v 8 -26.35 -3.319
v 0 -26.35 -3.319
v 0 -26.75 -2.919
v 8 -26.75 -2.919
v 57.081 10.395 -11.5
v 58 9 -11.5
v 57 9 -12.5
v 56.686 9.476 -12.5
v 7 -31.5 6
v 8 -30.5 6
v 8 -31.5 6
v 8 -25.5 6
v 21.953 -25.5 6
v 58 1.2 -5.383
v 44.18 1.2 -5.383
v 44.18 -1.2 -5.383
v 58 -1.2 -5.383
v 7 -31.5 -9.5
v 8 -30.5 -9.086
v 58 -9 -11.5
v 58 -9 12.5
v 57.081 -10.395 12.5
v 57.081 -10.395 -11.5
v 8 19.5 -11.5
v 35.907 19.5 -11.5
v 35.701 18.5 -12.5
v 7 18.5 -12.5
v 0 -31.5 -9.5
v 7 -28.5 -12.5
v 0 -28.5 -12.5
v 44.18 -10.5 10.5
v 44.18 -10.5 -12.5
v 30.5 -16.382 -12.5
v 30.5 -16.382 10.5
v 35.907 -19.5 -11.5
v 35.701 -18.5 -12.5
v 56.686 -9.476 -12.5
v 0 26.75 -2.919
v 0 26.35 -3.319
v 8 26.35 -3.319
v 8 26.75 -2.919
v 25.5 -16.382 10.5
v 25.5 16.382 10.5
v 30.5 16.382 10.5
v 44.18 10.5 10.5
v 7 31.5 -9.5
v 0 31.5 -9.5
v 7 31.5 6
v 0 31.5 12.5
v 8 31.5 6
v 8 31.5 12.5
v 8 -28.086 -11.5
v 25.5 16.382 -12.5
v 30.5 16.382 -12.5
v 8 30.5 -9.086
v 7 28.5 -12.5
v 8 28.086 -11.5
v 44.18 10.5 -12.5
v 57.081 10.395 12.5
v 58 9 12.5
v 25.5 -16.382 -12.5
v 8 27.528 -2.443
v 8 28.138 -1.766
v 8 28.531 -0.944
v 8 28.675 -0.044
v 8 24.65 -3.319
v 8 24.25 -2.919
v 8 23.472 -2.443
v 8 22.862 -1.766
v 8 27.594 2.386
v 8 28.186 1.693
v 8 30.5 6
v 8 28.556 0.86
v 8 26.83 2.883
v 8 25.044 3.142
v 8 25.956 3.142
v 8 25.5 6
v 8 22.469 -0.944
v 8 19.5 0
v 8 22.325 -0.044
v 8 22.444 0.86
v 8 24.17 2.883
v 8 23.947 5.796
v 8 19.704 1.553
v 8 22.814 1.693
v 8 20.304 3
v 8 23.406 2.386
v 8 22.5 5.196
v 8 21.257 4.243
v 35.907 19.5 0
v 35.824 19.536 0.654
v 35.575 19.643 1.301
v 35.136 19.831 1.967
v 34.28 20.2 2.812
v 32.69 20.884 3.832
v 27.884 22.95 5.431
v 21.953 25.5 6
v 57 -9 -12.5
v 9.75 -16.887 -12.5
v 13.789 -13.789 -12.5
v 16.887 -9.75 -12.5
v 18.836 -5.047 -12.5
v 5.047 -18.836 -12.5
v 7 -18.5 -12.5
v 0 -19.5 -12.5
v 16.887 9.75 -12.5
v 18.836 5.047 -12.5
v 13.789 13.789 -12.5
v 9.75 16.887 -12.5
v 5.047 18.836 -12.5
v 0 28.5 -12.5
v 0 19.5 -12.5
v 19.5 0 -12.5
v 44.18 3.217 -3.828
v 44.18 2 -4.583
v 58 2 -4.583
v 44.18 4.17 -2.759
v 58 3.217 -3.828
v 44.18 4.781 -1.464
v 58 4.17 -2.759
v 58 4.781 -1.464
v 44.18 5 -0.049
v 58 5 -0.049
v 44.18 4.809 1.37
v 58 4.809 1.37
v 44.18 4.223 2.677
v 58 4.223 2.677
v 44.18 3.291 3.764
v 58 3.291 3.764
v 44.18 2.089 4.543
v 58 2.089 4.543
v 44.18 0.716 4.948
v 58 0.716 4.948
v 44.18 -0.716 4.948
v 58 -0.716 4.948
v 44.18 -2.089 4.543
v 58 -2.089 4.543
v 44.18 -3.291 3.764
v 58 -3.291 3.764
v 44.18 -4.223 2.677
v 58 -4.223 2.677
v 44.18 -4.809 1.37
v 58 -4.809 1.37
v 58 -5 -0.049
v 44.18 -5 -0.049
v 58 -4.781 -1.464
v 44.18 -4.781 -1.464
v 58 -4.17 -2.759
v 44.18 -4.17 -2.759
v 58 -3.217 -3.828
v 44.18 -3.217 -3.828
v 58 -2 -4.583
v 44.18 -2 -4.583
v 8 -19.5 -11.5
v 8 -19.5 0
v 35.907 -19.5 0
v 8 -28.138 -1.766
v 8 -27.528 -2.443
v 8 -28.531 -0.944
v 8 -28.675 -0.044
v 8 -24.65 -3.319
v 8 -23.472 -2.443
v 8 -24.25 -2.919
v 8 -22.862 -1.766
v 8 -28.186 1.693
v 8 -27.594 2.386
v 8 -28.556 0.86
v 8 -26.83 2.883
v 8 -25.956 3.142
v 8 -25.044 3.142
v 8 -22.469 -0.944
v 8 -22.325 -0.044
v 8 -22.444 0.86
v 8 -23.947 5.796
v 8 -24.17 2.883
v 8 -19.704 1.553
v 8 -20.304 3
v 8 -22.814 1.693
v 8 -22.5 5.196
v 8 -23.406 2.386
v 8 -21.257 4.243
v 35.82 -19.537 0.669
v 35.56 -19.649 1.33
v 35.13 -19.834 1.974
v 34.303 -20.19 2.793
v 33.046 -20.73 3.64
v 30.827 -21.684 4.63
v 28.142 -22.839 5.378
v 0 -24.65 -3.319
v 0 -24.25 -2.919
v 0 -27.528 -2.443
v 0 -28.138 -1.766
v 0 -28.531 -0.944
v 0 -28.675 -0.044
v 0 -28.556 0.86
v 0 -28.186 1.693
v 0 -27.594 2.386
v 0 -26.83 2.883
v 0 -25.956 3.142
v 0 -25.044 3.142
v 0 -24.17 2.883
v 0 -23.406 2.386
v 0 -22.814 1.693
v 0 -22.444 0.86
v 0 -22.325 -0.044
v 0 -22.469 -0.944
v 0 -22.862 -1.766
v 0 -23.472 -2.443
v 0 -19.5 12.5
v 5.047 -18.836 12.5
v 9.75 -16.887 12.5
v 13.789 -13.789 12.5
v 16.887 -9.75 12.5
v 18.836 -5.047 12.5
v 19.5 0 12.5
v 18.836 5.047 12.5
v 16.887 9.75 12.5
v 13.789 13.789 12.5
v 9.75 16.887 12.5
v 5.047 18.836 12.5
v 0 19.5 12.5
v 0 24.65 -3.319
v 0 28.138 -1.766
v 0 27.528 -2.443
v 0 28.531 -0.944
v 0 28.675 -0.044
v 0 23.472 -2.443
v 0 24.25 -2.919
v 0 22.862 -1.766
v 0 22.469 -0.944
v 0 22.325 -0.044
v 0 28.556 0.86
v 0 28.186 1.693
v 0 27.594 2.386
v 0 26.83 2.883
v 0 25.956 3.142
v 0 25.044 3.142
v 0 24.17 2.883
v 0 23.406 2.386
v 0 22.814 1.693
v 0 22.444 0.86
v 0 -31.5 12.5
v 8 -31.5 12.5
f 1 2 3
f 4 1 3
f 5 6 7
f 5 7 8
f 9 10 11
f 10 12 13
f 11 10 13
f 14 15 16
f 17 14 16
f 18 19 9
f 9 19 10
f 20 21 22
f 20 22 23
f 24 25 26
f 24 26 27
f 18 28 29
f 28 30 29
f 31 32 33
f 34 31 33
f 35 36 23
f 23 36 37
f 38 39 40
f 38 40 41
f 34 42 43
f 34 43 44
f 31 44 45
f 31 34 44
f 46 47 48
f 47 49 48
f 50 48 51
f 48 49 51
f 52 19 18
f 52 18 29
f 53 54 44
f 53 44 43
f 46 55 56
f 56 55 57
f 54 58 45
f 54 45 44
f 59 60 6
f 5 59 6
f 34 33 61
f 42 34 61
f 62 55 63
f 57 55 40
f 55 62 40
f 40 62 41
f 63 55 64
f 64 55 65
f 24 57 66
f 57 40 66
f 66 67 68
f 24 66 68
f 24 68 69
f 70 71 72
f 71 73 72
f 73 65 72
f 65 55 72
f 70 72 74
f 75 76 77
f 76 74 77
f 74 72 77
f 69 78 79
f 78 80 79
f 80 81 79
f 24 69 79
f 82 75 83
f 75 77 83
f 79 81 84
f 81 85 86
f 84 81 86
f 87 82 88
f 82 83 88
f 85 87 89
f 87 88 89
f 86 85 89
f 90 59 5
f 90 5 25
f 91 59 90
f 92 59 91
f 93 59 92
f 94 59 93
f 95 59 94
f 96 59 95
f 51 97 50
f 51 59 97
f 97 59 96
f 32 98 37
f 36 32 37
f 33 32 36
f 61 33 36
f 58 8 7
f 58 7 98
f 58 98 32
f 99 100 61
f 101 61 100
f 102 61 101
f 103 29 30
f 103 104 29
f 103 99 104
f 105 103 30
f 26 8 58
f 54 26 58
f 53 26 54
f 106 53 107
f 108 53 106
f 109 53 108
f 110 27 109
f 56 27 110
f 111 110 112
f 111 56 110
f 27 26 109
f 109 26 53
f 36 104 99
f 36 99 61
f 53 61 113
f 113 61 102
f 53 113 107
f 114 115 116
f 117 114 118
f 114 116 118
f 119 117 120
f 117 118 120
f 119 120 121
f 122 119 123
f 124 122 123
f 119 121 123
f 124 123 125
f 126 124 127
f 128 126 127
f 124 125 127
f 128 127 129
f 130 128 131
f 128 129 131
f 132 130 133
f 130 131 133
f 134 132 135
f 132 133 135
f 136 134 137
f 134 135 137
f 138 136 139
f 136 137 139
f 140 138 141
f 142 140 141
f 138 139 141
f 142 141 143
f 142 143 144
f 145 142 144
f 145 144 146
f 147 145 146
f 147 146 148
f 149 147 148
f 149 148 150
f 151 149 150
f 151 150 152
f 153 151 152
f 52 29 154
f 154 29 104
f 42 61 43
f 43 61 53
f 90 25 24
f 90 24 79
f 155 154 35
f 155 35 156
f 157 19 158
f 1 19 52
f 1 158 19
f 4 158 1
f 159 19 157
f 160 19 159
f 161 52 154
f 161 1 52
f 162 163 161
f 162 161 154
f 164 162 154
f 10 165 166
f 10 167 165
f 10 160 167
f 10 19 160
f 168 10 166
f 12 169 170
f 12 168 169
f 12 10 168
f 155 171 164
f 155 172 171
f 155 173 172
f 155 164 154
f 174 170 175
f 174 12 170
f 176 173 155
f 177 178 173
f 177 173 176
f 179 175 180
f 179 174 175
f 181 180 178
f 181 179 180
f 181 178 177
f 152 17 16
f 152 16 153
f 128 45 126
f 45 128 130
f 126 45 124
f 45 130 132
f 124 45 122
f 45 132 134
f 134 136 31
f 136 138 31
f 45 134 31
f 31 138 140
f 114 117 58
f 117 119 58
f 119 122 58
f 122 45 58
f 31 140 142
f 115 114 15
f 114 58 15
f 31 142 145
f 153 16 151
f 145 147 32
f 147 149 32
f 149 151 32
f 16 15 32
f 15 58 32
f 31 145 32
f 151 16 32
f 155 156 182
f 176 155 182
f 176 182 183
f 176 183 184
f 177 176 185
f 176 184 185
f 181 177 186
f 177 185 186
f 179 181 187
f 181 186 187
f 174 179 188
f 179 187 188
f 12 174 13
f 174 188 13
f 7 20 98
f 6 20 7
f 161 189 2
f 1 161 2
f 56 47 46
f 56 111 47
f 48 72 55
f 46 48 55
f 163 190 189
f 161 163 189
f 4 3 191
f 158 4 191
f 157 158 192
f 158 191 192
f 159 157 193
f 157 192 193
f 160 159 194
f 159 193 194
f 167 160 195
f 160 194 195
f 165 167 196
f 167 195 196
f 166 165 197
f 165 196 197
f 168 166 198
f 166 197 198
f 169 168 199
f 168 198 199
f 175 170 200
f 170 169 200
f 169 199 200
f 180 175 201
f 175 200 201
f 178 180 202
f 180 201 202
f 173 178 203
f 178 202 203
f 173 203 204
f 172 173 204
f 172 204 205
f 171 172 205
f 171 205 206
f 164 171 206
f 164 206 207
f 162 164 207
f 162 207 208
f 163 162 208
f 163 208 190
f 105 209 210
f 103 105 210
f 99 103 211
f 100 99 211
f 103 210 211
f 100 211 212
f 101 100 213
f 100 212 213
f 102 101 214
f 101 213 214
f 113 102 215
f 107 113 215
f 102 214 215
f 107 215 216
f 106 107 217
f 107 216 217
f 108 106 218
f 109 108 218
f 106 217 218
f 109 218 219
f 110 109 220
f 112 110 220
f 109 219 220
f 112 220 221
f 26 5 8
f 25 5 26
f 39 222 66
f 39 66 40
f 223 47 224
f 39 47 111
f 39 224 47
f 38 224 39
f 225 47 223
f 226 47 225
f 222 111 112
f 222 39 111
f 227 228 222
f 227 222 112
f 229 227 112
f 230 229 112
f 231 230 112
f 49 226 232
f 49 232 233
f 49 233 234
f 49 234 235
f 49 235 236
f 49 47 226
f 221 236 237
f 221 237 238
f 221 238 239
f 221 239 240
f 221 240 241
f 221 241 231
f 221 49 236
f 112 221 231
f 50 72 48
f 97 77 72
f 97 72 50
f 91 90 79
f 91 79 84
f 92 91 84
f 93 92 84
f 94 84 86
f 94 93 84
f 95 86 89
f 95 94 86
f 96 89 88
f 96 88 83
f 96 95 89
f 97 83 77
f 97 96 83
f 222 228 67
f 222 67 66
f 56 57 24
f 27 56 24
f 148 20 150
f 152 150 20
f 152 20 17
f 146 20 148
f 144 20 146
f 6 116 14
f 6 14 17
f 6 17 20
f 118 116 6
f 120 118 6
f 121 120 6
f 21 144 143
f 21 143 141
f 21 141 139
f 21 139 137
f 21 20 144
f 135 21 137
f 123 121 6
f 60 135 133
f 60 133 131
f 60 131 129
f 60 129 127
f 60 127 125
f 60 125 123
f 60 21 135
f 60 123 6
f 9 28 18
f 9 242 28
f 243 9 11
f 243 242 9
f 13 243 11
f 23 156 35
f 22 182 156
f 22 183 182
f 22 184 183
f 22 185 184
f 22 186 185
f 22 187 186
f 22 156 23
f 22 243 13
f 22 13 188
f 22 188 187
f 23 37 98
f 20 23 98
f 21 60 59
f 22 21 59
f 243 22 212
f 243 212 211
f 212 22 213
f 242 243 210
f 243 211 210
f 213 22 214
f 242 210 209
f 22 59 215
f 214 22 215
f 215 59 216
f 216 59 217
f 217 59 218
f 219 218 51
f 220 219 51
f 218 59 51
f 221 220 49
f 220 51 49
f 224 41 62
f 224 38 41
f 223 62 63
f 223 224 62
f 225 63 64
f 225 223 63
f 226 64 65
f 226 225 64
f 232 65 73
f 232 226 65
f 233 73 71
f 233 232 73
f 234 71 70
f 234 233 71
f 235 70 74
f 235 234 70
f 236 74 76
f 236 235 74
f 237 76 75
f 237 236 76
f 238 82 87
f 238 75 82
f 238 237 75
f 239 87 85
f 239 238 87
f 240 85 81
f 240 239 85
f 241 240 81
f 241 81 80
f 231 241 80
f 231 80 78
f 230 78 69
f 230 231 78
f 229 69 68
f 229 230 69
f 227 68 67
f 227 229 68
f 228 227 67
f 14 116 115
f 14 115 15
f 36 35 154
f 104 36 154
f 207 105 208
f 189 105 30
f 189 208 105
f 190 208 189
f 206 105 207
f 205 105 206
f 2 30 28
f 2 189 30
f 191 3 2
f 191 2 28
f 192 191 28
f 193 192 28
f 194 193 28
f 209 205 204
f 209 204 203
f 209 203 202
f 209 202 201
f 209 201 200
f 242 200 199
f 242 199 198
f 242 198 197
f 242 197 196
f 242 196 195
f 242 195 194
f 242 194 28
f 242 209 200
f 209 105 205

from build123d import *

# Parameters (mm, degrees)
PAD002_DEPTH    = 12.5
POCKET_DEPTH    = 23
SKETCH006_R     = 5
POCKET001_DEPTH = 13.8201293065
SKETCH007_R     = 3.175
POCKET002_DEPTH = 236.4162459853
POCKET003_DEPTH = 50
POCKET004_DEPTH = 236.4162459853
POCKET005_DEPTH = 13.8201293065
CHAMFER_SIZE    = 3
CHAMFER001_SIZE = 1


with BuildPart() as part:
    # Sketch004 → Pad002 (new body, symmetric)
    with BuildSketch(Plane.XY):
        with BuildLine():
            ThreePointArc((0, -19.5), (19.5, 0), (0, 19.5))
            Line((0, 31.5), (0, 19.5))
            Line((0, 31.5), (8, 31.5))
            Line((58, 10), (8, 31.5))
            Line((58, -10), (58, 10))
            Line((8, -31.5), (58, -10))
            Line((0, -31.5), (8, -31.5))
            Line((0, -19.5), (0, -31.5))
        make_face()
    extrude(amount=PAD002_DEPTH, both=True)

    # Sketch005 (on Face9 of Pad002) → Pocket (cut)
    with BuildSketch(Plane(origin=(0, 0, -12.5), x_dir=(1, 0, 0), z_dir=(0, 0, -1))):
        Polygon((44.1798706935, 0), (44.1798706935, 10.5), (30.5, 16.3823443982), (25.5, 16.3823443982), (25.5, 0), align=None)
    pocket = extrude(amount=-POCKET_DEPTH, mode=Mode.SUBTRACT)

    # Mirrored: Pocket across Sketch005 H_Axis
    add(pocket.mirror(Plane(origin=(0, 0, -12.5), x_dir=(0, 0, -1), z_dir=(0, -1, 0))), mode=Mode.SUBTRACT)

    # Sketch006 (on Face9 of Mirrored) → Pocket001 (cut)
    with BuildSketch(Plane.YZ.offset(58)):
        Circle(SKETCH006_R)
    extrude(amount=-POCKET001_DEPTH, mode=Mode.SUBTRACT)

    # Sketch007 (on Face1 of Pocket001) → Pocket002 (cut, through all)
    with BuildSketch(Plane(origin=(0, 0, 0), x_dir=(0, -1, 0), z_dir=(-1, 0, 0))):
        with Locations((25.5, 0)):
            Circle(SKETCH007_R)
    pocket002 = extrude(amount=-POCKET002_DEPTH, mode=Mode.SUBTRACT)

    # Mirrored001: Pocket002 across Sketch007 V_Axis
    add(pocket002.mirror(Plane(origin=(0, 0, 0), x_dir=(-1, 0, 0), z_dir=(0, -1, 0))), mode=Mode.SUBTRACT)

    # Sketch008 (on Face10 of Mirrored001) → Pocket003 (cut)
    with BuildSketch(Plane.YZ.offset(58)):
        with BuildLine():
            ThreePointArc((-19.5, 0), (-21.2573593129, 4.2426406871), (-25.5, 6))
            Line((-25.5, 6), (-31.5, 6))
            Line((-31.5, 6), (-31.5, -12.5))
            Line((-31.5, -12.5), (-19.5, -12.5))
            Line((-19.5, -12.5), (-19.5, 0))
        make_face()
    pocket003 = extrude(amount=-POCKET003_DEPTH, mode=Mode.SUBTRACT)

    # Mirrored002: Pocket003 across Sketch008 V_Axis
    add(pocket003.mirror(Plane(origin=(58, 0, 0), x_dir=(1, 0, 0), z_dir=(0, 1, 0))), mode=Mode.SUBTRACT)

    # Sketch009 (on Face1 of Mirrored002) → Pocket004 (cut, through all)
    with BuildSketch(Plane(origin=(0, 0, 0), x_dir=(0, -1, 0), z_dir=(-1, 0, 0))):
        Polygon((24.25, -2.918582704), (24.65, -3.318582704), (26.35, -3.318582704), (26.75, -2.918582704), align=None)
    pocket004 = extrude(amount=-POCKET004_DEPTH, mode=Mode.SUBTRACT)

    # Mirrored003: Pocket004 across Sketch009 V_Axis
    add(pocket004.mirror(Plane(origin=(0, 0, 0), x_dir=(-1, 0, 0), z_dir=(0, -1, 0))), mode=Mode.SUBTRACT)

    # Sketch010 (on Face16 of Mirrored003) → Pocket005 (cut)
    with BuildSketch(Plane.YZ.offset(58)):
        Polygon((-2, -4.582575695), (2, -4.582575695), (1.2, -5.382575695), (-1.2, -5.382575695), align=None)
    extrude(amount=-POCKET005_DEPTH, mode=Mode.SUBTRACT)

    # Chamfer
    chamfer_edges = [part.edges().sort_by_distance(p)[0] for p in [
        (4, -31.5, -12.5),
        (4, 31.5, -12.5),
    ]]
    chamfer(chamfer_edges, length=CHAMFER_SIZE)

    # Chamfer001
    chamfer001_edges = [part.edges().sort_by_distance(p)[0] for p in [
        (21.953488, -19.5, -12.5),
        (8, -24, -12.5),
        (8, -30, -11),
        (8, -31.5, -1.75),
        (46.953488, -14.75, -12.5),
        (58, 0, -12.5),
        (46.953488, 14.75, -12.5),
        (21.953488, 19.5, -12.5),
        (8, 24, -12.5),
        (8, 30, -11),
        (8, 31.5, -1.75),
        (58, -10, 0),
        (58, 10, 0),
    ]]
    chamfer(chamfer001_edges, length=CHAMFER001_SIZE)


solid = part.part
